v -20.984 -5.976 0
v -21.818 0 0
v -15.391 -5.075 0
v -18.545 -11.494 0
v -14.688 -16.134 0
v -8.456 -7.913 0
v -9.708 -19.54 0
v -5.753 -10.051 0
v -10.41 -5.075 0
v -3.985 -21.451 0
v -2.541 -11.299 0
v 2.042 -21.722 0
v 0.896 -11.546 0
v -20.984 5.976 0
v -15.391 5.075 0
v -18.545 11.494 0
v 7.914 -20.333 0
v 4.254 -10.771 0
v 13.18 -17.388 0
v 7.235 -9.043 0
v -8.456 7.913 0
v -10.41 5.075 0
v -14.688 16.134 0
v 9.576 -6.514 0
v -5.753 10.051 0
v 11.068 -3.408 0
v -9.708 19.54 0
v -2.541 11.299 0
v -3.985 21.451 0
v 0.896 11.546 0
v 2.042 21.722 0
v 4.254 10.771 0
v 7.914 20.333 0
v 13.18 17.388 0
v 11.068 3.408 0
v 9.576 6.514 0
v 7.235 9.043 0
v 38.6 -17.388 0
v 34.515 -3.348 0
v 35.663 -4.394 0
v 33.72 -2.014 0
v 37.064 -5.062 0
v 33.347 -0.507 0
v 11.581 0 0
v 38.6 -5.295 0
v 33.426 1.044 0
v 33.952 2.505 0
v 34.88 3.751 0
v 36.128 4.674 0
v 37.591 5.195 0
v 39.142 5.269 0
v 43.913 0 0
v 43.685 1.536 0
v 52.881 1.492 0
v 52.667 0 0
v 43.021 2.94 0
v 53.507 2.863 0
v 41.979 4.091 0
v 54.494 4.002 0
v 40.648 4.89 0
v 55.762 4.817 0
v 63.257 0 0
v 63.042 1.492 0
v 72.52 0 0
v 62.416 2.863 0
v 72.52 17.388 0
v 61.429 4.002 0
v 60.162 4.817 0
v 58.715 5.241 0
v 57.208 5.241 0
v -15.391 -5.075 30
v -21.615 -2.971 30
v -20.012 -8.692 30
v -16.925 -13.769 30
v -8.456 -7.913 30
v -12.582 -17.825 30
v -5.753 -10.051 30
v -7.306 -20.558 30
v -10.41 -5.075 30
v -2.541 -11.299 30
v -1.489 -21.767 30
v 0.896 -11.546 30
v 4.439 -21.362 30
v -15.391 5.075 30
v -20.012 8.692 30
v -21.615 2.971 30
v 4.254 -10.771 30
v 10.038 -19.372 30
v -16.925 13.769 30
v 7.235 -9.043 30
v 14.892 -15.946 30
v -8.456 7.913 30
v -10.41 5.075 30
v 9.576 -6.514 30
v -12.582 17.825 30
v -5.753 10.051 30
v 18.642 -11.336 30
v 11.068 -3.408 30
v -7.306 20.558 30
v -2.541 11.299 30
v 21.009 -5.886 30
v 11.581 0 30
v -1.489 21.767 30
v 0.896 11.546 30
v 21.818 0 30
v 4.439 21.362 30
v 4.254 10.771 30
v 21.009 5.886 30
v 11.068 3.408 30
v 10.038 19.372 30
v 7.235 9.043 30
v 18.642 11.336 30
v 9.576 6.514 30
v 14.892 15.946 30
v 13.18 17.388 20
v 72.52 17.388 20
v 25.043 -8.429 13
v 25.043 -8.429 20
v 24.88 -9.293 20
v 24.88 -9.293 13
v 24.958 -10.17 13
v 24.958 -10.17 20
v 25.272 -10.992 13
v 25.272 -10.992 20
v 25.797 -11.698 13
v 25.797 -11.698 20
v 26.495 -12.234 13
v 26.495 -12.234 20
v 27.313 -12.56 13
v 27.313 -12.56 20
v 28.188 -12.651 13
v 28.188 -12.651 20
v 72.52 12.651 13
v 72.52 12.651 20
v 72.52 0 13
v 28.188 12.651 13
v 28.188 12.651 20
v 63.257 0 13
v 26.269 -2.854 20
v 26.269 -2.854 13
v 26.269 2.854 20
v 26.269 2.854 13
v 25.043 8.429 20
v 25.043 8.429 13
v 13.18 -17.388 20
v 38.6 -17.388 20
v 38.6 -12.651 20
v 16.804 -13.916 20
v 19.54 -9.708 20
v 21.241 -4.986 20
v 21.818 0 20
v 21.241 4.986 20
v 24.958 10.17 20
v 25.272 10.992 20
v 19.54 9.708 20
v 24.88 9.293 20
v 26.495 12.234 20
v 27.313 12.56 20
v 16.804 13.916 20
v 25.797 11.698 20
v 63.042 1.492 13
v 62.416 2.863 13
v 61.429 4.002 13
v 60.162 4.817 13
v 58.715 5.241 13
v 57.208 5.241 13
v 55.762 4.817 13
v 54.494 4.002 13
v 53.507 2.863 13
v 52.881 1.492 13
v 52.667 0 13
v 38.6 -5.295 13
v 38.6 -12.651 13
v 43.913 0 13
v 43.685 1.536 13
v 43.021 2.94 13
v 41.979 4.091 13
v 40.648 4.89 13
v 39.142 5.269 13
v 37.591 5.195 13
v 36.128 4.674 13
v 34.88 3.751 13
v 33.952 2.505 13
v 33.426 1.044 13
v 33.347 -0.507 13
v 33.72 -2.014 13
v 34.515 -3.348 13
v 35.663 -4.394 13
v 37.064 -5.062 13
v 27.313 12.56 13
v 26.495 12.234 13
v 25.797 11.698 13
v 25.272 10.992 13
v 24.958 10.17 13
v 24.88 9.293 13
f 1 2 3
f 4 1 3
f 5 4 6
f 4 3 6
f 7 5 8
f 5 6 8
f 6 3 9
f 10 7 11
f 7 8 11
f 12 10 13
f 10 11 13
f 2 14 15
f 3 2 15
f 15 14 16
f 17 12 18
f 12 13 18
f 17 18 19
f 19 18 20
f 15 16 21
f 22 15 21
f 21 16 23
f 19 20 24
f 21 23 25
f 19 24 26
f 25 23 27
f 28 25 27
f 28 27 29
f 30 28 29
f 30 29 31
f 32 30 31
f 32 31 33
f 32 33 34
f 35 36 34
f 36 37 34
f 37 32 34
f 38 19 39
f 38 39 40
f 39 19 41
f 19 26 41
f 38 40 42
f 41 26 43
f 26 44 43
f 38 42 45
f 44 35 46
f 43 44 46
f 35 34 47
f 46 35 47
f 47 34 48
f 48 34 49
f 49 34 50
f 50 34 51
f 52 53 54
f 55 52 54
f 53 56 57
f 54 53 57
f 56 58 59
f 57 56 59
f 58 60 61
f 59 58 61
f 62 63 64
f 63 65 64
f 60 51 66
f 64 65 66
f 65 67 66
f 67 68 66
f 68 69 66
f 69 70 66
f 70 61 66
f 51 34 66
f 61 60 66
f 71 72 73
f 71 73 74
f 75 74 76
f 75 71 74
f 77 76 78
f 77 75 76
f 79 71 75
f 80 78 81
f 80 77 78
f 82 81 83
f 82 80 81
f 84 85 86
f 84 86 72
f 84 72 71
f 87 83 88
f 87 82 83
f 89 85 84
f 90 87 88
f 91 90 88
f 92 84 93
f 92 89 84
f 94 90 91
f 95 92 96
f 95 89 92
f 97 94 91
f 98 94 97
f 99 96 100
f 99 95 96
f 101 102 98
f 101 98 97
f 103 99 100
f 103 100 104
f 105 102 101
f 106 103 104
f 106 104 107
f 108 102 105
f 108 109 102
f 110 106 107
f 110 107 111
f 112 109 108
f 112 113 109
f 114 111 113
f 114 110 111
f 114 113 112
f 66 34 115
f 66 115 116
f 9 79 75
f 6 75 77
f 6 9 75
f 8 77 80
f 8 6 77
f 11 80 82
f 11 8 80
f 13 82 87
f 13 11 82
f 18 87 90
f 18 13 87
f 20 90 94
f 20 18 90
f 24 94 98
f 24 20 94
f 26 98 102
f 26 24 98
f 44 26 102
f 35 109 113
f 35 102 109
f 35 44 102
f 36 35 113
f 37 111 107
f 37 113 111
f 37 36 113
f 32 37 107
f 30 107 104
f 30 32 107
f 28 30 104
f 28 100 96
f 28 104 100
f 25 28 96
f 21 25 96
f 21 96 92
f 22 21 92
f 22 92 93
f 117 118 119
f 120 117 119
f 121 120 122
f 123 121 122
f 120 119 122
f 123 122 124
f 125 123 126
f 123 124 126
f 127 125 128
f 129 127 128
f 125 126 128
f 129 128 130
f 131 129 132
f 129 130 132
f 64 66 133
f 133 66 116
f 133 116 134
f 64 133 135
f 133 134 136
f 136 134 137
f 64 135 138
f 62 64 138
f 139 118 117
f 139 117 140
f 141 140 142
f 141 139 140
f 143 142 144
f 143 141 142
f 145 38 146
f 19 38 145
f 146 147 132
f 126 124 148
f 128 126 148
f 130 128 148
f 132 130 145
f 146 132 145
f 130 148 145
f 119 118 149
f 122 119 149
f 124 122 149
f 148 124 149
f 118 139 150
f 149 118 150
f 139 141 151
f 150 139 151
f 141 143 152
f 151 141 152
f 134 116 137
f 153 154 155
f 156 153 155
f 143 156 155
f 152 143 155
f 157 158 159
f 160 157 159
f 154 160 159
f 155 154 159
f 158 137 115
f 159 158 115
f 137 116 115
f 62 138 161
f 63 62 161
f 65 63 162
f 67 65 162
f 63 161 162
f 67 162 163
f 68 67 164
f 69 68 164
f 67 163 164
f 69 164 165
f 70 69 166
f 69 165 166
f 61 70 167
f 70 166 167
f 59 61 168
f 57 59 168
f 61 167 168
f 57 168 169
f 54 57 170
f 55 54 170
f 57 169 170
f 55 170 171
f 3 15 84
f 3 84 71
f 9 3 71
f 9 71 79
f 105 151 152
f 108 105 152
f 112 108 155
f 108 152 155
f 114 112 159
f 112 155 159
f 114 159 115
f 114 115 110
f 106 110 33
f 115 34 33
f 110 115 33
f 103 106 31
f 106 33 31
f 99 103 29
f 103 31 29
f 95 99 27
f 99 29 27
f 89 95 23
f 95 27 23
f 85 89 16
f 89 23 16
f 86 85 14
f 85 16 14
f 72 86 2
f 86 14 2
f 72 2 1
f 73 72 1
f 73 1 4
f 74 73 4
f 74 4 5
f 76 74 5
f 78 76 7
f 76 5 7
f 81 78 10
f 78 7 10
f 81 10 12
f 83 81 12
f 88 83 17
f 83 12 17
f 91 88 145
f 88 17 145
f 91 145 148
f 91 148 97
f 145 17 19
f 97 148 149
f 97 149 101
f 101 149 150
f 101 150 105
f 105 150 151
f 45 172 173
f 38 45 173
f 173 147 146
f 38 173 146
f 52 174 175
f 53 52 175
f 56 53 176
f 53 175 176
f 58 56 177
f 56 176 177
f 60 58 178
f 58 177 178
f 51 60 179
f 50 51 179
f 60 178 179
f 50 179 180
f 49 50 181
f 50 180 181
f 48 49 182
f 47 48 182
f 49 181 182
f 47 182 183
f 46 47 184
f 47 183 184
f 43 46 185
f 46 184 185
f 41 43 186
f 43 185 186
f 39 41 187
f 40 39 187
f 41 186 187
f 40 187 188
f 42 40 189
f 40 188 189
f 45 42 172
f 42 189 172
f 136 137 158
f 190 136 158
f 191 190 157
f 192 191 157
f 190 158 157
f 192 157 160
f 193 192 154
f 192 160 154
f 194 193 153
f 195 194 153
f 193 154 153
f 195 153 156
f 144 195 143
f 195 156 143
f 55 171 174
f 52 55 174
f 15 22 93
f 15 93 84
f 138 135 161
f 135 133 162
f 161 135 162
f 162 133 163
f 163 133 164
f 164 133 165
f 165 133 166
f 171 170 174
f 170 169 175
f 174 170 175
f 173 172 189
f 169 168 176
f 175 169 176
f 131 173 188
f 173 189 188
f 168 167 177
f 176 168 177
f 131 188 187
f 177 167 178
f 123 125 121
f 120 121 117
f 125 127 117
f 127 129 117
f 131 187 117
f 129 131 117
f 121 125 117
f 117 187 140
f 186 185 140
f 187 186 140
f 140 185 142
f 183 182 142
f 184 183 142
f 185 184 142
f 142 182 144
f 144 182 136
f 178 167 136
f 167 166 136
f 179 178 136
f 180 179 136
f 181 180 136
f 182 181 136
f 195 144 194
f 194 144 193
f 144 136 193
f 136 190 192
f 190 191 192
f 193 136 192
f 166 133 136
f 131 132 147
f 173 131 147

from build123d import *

# Parameters (mm, degrees)
PAD_DEPTH         = 20
SKETCH002_R       = 21.818264
PAD001_DEPTH      = 30
POCKET_DEPTH      = 0.001
POCKET_DEPTH_BACK = -30.001
POCKET001_DEPTH   = 7
SKETCH005_R       = 5.295073
POCKET002_DEPTH   = 13.001
POCKET003_DEPTH   = 20.001


with BuildPart() as part:
    # Sketch001 → Pad (new body)
    with BuildSketch(Plane.XY):
        with BuildLine():
            ThreePointArc((13.179717, -17.387688), (21.818264, 0), (13.179717, 17.387688))
            Line((13.179717, 17.387688), (92.096497, 17.387688))
            Line((92.096497, 17.387688), (92.096497, -17.387688))
            Line((92.096497, -17.387688), (13.179717, -17.387688))
        make_face()
    extrude(amount=PAD_DEPTH)

    # Sketch002 → Pad001 (join)
    with BuildSketch(Plane.XY):
        Circle(SKETCH002_R)
    extrude(amount=PAD001_DEPTH)

    # Sketch003 → Pocket (cut, two sides)
    with BuildSketch(Plane.XY) as pocket_sk:
        with BuildLine():
            ThreePointArc((-10.409979, -5.074877), (11.581107, 0), (-10.409979, 5.074877))
            Line((-10.409979, 5.074877), (-15.391012, 5.074877))
            Line((-15.391012, 5.074877), (-15.391012, -5.074877))
            Line((-15.391012, -5.074877), (-10.409979, -5.074877))
        make_face()
    extrude(amount=-POCKET_DEPTH, mode=Mode.SUBTRACT)
    extrude(pocket_sk.sketch, amount=-POCKET_DEPTH_BACK, mode=Mode.SUBTRACT)

    # Sketch004 → Pocket001 (cut)
    with BuildSketch(Plane.XY.offset(20)):
        with BuildLine():
            ThreePointArc((25.04314, -8.428525), (26.423454, 0), (25.04314, 8.428525))
            ThreePointArc((28.188104, 12.650604), (25.510048, 11.36309), (25.04314, 8.428525))
            Line((74.586278, 12.650604), (28.188104, 12.650604))
            Line((74.586278, -12.650604), (74.586278, 12.650604))
            Line((28.188104, -12.650604), (74.586278, -12.650604))
            ThreePointArc((25.04314, -8.428525), (25.510048, -11.36309), (28.188104, -12.650604))
        make_face()
    extrude(amount=-POCKET001_DEPTH, mode=Mode.SUBTRACT)

    # Sketch005 (on Face18 of Pocket001) → Pocket002 (cut, through all)
    with BuildSketch(Plane.XY.offset(13)):
        with Locations((57.961857, 0)):
            Circle(SKETCH005_R)
        with Locations((38.617462, 0)):
            Circle(SKETCH005_R)
    extrude(amount=-POCKET002_DEPTH, mode=Mode.SUBTRACT)

    # Sketch006 (on Face5 of Pocket002) → Pocket003 (cut, through all)
    with BuildSketch(Plane.XY.offset(20)):
        Polygon((38.599522, 0), (38.599522, -29.031481), (99.493477, -29.031481), (99.493477, 19.057034), (72.520317, 19.057034), (72.520317, 0), align=None)
    extrude(amount=-POCKET003_DEPTH, mode=Mode.SUBTRACT)


solid = part.part
